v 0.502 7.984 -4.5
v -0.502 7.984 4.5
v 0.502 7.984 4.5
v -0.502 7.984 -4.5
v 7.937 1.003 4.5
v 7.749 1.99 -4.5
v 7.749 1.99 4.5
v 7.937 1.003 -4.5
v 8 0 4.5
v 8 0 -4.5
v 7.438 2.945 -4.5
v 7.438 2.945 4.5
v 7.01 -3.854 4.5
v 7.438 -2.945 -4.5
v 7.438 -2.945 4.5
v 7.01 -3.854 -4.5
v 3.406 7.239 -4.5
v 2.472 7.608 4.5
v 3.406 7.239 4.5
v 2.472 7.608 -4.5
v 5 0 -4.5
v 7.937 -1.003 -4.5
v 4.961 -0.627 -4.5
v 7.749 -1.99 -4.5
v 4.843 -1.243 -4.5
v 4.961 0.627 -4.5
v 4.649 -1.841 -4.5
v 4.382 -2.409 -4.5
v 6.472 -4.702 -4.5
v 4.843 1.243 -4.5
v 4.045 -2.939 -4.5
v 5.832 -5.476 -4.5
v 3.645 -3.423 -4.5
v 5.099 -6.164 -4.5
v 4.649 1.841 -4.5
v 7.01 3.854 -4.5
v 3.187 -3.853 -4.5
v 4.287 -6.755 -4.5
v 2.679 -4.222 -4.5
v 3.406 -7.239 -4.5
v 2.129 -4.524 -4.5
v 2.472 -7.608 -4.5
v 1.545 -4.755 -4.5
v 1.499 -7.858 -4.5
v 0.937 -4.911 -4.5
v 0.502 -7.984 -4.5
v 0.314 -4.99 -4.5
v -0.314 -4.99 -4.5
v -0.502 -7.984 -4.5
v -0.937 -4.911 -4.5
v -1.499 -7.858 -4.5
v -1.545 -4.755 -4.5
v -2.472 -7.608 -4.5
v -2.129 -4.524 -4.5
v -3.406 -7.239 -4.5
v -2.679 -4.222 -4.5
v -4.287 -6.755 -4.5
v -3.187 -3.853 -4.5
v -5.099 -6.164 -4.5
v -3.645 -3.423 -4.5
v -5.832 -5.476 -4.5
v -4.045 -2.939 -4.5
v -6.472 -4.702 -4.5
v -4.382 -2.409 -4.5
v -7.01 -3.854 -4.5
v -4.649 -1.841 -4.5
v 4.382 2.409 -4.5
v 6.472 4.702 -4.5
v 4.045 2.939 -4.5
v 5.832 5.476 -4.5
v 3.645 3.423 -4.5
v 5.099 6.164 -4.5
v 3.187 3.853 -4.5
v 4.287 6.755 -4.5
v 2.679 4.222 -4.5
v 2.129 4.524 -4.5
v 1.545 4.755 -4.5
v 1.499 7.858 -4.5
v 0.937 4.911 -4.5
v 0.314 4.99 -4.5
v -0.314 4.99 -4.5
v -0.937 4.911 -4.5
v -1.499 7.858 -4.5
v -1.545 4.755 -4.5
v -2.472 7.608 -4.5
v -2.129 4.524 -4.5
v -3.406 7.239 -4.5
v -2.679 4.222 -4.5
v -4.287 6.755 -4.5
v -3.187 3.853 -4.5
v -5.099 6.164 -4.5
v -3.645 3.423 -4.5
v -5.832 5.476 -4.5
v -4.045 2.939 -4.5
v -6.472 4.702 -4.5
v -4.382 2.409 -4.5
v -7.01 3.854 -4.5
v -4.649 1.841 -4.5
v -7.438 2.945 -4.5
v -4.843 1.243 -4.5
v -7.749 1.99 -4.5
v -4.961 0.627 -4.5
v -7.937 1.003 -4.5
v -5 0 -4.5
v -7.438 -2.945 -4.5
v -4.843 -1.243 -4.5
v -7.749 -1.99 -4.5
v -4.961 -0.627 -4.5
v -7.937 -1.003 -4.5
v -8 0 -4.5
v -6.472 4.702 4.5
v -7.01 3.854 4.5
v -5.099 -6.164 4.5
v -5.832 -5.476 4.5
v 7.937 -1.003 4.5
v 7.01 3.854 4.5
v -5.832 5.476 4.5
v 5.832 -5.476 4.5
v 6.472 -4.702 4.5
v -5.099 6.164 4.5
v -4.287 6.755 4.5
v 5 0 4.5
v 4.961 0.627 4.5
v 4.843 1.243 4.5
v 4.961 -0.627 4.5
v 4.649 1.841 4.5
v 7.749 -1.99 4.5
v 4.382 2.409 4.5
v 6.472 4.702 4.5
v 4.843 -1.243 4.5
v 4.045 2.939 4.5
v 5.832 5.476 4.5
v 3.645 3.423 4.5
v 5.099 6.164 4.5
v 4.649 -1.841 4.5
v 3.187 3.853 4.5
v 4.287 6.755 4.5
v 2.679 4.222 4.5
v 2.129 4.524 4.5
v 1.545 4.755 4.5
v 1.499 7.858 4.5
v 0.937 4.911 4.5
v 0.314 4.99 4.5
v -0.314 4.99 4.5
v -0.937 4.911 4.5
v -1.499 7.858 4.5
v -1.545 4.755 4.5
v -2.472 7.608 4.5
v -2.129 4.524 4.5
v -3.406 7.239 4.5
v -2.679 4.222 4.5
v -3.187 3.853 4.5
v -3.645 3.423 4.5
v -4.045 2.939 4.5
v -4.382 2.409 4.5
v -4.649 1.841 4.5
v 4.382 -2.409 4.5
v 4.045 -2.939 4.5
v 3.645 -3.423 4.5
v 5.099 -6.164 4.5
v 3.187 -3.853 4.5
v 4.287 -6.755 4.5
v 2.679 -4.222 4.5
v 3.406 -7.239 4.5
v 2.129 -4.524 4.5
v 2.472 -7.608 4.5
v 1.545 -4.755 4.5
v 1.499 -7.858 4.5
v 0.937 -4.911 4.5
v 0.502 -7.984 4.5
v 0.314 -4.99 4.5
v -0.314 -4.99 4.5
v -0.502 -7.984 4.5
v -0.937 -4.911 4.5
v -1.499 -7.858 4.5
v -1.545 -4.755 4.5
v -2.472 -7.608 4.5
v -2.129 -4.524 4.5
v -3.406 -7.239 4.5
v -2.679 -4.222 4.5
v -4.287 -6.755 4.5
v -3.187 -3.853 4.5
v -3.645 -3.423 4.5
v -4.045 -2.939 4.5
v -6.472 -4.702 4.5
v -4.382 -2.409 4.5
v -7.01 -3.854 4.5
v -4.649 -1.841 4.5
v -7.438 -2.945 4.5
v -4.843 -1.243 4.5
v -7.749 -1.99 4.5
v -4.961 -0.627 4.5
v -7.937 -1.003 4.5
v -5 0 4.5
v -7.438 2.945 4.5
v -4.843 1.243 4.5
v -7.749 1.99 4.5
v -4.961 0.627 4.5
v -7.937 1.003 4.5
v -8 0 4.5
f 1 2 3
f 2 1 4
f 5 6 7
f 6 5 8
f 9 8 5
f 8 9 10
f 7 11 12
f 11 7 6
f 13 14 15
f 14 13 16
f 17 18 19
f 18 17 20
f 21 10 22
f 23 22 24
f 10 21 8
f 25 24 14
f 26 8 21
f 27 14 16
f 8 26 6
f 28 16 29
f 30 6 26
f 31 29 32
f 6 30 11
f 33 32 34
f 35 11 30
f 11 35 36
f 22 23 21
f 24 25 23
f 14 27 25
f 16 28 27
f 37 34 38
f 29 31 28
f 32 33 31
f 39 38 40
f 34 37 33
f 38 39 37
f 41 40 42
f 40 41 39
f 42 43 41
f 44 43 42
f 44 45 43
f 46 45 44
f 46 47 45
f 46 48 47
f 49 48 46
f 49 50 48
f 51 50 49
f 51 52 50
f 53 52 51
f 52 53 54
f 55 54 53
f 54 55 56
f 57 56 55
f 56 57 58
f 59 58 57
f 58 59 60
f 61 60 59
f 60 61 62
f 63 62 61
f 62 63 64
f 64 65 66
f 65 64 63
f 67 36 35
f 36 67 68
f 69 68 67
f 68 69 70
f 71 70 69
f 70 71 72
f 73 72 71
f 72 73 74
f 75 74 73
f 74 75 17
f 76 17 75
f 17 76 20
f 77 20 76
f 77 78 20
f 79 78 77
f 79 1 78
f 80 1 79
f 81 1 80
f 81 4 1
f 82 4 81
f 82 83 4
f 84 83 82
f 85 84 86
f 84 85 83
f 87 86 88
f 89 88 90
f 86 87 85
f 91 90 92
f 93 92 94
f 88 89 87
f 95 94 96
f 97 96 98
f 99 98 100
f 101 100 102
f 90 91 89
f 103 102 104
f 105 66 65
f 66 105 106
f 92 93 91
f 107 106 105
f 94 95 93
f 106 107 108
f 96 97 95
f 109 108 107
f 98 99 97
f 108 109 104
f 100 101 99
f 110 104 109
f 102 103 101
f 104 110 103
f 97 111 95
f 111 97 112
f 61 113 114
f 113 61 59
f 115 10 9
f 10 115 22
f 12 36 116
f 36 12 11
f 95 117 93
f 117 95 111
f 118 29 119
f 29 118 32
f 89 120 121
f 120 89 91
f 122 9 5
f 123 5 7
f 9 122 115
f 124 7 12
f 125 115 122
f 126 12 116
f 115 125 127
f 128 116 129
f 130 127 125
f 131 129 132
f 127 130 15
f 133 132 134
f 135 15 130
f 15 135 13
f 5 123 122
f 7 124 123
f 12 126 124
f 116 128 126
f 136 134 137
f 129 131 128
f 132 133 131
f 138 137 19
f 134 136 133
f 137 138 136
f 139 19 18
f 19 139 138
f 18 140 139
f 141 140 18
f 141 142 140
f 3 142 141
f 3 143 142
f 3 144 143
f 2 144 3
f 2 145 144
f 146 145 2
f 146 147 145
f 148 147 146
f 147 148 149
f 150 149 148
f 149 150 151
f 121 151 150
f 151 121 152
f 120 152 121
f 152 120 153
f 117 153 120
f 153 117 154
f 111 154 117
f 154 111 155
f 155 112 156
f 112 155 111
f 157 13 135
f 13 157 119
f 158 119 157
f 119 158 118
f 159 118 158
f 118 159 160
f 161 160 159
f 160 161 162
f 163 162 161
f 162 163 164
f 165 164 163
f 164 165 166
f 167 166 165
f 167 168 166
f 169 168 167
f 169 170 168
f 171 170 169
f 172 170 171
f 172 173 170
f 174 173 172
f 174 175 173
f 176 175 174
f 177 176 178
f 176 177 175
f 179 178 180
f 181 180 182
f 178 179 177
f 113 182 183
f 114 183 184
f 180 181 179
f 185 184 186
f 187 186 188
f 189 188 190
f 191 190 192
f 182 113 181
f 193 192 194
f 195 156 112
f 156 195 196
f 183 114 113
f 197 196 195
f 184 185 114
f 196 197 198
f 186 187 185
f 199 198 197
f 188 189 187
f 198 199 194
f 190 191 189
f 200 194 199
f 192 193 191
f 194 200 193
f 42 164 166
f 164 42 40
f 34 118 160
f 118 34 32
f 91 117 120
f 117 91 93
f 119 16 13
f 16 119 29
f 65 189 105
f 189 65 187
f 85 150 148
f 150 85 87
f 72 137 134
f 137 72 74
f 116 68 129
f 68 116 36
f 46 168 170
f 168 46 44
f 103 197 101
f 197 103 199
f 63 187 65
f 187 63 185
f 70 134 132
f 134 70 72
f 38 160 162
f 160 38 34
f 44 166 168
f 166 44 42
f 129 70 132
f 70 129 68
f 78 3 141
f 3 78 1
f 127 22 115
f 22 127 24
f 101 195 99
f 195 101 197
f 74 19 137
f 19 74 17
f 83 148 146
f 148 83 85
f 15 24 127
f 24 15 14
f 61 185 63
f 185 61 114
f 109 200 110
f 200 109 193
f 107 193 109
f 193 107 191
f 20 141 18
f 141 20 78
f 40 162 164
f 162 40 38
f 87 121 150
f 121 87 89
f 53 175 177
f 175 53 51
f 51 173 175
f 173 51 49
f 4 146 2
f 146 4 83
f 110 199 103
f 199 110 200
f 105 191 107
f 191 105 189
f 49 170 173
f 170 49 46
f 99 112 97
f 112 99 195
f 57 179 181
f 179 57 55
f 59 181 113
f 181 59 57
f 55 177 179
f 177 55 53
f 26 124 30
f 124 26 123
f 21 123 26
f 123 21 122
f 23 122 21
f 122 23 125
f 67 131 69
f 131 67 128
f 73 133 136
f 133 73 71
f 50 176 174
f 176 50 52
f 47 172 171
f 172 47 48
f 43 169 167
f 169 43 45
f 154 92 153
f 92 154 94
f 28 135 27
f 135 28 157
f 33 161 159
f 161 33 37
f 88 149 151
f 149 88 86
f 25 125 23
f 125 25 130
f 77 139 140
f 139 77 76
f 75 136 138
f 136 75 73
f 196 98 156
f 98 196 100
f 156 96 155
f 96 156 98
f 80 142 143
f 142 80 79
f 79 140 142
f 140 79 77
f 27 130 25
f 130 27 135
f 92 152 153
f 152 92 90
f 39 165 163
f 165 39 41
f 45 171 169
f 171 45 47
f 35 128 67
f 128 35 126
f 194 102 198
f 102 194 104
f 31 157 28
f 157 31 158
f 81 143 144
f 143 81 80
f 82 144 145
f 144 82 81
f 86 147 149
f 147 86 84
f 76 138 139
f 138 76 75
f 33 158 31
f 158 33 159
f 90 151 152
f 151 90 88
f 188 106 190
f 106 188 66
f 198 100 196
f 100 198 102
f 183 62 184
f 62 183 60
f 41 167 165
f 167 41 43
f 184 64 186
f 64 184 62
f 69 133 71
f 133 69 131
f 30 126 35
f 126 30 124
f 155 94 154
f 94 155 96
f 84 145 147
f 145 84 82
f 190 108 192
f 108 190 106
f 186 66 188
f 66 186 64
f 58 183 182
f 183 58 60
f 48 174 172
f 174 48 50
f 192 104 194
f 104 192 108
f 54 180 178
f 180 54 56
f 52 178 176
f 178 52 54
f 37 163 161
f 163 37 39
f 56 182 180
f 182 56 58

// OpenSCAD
$fn = 50;


difference() {
	union() {
		translate(v = [0, 0, -4.5000000000]) {
			cylinder(h = 9, r = 8.0000000000);
		}
	}
	union() {
		translate(v = [0, 0, -100.0000000000]) {
			cylinder(h = 200, r = 5.0000000000);
		}
	}
}
